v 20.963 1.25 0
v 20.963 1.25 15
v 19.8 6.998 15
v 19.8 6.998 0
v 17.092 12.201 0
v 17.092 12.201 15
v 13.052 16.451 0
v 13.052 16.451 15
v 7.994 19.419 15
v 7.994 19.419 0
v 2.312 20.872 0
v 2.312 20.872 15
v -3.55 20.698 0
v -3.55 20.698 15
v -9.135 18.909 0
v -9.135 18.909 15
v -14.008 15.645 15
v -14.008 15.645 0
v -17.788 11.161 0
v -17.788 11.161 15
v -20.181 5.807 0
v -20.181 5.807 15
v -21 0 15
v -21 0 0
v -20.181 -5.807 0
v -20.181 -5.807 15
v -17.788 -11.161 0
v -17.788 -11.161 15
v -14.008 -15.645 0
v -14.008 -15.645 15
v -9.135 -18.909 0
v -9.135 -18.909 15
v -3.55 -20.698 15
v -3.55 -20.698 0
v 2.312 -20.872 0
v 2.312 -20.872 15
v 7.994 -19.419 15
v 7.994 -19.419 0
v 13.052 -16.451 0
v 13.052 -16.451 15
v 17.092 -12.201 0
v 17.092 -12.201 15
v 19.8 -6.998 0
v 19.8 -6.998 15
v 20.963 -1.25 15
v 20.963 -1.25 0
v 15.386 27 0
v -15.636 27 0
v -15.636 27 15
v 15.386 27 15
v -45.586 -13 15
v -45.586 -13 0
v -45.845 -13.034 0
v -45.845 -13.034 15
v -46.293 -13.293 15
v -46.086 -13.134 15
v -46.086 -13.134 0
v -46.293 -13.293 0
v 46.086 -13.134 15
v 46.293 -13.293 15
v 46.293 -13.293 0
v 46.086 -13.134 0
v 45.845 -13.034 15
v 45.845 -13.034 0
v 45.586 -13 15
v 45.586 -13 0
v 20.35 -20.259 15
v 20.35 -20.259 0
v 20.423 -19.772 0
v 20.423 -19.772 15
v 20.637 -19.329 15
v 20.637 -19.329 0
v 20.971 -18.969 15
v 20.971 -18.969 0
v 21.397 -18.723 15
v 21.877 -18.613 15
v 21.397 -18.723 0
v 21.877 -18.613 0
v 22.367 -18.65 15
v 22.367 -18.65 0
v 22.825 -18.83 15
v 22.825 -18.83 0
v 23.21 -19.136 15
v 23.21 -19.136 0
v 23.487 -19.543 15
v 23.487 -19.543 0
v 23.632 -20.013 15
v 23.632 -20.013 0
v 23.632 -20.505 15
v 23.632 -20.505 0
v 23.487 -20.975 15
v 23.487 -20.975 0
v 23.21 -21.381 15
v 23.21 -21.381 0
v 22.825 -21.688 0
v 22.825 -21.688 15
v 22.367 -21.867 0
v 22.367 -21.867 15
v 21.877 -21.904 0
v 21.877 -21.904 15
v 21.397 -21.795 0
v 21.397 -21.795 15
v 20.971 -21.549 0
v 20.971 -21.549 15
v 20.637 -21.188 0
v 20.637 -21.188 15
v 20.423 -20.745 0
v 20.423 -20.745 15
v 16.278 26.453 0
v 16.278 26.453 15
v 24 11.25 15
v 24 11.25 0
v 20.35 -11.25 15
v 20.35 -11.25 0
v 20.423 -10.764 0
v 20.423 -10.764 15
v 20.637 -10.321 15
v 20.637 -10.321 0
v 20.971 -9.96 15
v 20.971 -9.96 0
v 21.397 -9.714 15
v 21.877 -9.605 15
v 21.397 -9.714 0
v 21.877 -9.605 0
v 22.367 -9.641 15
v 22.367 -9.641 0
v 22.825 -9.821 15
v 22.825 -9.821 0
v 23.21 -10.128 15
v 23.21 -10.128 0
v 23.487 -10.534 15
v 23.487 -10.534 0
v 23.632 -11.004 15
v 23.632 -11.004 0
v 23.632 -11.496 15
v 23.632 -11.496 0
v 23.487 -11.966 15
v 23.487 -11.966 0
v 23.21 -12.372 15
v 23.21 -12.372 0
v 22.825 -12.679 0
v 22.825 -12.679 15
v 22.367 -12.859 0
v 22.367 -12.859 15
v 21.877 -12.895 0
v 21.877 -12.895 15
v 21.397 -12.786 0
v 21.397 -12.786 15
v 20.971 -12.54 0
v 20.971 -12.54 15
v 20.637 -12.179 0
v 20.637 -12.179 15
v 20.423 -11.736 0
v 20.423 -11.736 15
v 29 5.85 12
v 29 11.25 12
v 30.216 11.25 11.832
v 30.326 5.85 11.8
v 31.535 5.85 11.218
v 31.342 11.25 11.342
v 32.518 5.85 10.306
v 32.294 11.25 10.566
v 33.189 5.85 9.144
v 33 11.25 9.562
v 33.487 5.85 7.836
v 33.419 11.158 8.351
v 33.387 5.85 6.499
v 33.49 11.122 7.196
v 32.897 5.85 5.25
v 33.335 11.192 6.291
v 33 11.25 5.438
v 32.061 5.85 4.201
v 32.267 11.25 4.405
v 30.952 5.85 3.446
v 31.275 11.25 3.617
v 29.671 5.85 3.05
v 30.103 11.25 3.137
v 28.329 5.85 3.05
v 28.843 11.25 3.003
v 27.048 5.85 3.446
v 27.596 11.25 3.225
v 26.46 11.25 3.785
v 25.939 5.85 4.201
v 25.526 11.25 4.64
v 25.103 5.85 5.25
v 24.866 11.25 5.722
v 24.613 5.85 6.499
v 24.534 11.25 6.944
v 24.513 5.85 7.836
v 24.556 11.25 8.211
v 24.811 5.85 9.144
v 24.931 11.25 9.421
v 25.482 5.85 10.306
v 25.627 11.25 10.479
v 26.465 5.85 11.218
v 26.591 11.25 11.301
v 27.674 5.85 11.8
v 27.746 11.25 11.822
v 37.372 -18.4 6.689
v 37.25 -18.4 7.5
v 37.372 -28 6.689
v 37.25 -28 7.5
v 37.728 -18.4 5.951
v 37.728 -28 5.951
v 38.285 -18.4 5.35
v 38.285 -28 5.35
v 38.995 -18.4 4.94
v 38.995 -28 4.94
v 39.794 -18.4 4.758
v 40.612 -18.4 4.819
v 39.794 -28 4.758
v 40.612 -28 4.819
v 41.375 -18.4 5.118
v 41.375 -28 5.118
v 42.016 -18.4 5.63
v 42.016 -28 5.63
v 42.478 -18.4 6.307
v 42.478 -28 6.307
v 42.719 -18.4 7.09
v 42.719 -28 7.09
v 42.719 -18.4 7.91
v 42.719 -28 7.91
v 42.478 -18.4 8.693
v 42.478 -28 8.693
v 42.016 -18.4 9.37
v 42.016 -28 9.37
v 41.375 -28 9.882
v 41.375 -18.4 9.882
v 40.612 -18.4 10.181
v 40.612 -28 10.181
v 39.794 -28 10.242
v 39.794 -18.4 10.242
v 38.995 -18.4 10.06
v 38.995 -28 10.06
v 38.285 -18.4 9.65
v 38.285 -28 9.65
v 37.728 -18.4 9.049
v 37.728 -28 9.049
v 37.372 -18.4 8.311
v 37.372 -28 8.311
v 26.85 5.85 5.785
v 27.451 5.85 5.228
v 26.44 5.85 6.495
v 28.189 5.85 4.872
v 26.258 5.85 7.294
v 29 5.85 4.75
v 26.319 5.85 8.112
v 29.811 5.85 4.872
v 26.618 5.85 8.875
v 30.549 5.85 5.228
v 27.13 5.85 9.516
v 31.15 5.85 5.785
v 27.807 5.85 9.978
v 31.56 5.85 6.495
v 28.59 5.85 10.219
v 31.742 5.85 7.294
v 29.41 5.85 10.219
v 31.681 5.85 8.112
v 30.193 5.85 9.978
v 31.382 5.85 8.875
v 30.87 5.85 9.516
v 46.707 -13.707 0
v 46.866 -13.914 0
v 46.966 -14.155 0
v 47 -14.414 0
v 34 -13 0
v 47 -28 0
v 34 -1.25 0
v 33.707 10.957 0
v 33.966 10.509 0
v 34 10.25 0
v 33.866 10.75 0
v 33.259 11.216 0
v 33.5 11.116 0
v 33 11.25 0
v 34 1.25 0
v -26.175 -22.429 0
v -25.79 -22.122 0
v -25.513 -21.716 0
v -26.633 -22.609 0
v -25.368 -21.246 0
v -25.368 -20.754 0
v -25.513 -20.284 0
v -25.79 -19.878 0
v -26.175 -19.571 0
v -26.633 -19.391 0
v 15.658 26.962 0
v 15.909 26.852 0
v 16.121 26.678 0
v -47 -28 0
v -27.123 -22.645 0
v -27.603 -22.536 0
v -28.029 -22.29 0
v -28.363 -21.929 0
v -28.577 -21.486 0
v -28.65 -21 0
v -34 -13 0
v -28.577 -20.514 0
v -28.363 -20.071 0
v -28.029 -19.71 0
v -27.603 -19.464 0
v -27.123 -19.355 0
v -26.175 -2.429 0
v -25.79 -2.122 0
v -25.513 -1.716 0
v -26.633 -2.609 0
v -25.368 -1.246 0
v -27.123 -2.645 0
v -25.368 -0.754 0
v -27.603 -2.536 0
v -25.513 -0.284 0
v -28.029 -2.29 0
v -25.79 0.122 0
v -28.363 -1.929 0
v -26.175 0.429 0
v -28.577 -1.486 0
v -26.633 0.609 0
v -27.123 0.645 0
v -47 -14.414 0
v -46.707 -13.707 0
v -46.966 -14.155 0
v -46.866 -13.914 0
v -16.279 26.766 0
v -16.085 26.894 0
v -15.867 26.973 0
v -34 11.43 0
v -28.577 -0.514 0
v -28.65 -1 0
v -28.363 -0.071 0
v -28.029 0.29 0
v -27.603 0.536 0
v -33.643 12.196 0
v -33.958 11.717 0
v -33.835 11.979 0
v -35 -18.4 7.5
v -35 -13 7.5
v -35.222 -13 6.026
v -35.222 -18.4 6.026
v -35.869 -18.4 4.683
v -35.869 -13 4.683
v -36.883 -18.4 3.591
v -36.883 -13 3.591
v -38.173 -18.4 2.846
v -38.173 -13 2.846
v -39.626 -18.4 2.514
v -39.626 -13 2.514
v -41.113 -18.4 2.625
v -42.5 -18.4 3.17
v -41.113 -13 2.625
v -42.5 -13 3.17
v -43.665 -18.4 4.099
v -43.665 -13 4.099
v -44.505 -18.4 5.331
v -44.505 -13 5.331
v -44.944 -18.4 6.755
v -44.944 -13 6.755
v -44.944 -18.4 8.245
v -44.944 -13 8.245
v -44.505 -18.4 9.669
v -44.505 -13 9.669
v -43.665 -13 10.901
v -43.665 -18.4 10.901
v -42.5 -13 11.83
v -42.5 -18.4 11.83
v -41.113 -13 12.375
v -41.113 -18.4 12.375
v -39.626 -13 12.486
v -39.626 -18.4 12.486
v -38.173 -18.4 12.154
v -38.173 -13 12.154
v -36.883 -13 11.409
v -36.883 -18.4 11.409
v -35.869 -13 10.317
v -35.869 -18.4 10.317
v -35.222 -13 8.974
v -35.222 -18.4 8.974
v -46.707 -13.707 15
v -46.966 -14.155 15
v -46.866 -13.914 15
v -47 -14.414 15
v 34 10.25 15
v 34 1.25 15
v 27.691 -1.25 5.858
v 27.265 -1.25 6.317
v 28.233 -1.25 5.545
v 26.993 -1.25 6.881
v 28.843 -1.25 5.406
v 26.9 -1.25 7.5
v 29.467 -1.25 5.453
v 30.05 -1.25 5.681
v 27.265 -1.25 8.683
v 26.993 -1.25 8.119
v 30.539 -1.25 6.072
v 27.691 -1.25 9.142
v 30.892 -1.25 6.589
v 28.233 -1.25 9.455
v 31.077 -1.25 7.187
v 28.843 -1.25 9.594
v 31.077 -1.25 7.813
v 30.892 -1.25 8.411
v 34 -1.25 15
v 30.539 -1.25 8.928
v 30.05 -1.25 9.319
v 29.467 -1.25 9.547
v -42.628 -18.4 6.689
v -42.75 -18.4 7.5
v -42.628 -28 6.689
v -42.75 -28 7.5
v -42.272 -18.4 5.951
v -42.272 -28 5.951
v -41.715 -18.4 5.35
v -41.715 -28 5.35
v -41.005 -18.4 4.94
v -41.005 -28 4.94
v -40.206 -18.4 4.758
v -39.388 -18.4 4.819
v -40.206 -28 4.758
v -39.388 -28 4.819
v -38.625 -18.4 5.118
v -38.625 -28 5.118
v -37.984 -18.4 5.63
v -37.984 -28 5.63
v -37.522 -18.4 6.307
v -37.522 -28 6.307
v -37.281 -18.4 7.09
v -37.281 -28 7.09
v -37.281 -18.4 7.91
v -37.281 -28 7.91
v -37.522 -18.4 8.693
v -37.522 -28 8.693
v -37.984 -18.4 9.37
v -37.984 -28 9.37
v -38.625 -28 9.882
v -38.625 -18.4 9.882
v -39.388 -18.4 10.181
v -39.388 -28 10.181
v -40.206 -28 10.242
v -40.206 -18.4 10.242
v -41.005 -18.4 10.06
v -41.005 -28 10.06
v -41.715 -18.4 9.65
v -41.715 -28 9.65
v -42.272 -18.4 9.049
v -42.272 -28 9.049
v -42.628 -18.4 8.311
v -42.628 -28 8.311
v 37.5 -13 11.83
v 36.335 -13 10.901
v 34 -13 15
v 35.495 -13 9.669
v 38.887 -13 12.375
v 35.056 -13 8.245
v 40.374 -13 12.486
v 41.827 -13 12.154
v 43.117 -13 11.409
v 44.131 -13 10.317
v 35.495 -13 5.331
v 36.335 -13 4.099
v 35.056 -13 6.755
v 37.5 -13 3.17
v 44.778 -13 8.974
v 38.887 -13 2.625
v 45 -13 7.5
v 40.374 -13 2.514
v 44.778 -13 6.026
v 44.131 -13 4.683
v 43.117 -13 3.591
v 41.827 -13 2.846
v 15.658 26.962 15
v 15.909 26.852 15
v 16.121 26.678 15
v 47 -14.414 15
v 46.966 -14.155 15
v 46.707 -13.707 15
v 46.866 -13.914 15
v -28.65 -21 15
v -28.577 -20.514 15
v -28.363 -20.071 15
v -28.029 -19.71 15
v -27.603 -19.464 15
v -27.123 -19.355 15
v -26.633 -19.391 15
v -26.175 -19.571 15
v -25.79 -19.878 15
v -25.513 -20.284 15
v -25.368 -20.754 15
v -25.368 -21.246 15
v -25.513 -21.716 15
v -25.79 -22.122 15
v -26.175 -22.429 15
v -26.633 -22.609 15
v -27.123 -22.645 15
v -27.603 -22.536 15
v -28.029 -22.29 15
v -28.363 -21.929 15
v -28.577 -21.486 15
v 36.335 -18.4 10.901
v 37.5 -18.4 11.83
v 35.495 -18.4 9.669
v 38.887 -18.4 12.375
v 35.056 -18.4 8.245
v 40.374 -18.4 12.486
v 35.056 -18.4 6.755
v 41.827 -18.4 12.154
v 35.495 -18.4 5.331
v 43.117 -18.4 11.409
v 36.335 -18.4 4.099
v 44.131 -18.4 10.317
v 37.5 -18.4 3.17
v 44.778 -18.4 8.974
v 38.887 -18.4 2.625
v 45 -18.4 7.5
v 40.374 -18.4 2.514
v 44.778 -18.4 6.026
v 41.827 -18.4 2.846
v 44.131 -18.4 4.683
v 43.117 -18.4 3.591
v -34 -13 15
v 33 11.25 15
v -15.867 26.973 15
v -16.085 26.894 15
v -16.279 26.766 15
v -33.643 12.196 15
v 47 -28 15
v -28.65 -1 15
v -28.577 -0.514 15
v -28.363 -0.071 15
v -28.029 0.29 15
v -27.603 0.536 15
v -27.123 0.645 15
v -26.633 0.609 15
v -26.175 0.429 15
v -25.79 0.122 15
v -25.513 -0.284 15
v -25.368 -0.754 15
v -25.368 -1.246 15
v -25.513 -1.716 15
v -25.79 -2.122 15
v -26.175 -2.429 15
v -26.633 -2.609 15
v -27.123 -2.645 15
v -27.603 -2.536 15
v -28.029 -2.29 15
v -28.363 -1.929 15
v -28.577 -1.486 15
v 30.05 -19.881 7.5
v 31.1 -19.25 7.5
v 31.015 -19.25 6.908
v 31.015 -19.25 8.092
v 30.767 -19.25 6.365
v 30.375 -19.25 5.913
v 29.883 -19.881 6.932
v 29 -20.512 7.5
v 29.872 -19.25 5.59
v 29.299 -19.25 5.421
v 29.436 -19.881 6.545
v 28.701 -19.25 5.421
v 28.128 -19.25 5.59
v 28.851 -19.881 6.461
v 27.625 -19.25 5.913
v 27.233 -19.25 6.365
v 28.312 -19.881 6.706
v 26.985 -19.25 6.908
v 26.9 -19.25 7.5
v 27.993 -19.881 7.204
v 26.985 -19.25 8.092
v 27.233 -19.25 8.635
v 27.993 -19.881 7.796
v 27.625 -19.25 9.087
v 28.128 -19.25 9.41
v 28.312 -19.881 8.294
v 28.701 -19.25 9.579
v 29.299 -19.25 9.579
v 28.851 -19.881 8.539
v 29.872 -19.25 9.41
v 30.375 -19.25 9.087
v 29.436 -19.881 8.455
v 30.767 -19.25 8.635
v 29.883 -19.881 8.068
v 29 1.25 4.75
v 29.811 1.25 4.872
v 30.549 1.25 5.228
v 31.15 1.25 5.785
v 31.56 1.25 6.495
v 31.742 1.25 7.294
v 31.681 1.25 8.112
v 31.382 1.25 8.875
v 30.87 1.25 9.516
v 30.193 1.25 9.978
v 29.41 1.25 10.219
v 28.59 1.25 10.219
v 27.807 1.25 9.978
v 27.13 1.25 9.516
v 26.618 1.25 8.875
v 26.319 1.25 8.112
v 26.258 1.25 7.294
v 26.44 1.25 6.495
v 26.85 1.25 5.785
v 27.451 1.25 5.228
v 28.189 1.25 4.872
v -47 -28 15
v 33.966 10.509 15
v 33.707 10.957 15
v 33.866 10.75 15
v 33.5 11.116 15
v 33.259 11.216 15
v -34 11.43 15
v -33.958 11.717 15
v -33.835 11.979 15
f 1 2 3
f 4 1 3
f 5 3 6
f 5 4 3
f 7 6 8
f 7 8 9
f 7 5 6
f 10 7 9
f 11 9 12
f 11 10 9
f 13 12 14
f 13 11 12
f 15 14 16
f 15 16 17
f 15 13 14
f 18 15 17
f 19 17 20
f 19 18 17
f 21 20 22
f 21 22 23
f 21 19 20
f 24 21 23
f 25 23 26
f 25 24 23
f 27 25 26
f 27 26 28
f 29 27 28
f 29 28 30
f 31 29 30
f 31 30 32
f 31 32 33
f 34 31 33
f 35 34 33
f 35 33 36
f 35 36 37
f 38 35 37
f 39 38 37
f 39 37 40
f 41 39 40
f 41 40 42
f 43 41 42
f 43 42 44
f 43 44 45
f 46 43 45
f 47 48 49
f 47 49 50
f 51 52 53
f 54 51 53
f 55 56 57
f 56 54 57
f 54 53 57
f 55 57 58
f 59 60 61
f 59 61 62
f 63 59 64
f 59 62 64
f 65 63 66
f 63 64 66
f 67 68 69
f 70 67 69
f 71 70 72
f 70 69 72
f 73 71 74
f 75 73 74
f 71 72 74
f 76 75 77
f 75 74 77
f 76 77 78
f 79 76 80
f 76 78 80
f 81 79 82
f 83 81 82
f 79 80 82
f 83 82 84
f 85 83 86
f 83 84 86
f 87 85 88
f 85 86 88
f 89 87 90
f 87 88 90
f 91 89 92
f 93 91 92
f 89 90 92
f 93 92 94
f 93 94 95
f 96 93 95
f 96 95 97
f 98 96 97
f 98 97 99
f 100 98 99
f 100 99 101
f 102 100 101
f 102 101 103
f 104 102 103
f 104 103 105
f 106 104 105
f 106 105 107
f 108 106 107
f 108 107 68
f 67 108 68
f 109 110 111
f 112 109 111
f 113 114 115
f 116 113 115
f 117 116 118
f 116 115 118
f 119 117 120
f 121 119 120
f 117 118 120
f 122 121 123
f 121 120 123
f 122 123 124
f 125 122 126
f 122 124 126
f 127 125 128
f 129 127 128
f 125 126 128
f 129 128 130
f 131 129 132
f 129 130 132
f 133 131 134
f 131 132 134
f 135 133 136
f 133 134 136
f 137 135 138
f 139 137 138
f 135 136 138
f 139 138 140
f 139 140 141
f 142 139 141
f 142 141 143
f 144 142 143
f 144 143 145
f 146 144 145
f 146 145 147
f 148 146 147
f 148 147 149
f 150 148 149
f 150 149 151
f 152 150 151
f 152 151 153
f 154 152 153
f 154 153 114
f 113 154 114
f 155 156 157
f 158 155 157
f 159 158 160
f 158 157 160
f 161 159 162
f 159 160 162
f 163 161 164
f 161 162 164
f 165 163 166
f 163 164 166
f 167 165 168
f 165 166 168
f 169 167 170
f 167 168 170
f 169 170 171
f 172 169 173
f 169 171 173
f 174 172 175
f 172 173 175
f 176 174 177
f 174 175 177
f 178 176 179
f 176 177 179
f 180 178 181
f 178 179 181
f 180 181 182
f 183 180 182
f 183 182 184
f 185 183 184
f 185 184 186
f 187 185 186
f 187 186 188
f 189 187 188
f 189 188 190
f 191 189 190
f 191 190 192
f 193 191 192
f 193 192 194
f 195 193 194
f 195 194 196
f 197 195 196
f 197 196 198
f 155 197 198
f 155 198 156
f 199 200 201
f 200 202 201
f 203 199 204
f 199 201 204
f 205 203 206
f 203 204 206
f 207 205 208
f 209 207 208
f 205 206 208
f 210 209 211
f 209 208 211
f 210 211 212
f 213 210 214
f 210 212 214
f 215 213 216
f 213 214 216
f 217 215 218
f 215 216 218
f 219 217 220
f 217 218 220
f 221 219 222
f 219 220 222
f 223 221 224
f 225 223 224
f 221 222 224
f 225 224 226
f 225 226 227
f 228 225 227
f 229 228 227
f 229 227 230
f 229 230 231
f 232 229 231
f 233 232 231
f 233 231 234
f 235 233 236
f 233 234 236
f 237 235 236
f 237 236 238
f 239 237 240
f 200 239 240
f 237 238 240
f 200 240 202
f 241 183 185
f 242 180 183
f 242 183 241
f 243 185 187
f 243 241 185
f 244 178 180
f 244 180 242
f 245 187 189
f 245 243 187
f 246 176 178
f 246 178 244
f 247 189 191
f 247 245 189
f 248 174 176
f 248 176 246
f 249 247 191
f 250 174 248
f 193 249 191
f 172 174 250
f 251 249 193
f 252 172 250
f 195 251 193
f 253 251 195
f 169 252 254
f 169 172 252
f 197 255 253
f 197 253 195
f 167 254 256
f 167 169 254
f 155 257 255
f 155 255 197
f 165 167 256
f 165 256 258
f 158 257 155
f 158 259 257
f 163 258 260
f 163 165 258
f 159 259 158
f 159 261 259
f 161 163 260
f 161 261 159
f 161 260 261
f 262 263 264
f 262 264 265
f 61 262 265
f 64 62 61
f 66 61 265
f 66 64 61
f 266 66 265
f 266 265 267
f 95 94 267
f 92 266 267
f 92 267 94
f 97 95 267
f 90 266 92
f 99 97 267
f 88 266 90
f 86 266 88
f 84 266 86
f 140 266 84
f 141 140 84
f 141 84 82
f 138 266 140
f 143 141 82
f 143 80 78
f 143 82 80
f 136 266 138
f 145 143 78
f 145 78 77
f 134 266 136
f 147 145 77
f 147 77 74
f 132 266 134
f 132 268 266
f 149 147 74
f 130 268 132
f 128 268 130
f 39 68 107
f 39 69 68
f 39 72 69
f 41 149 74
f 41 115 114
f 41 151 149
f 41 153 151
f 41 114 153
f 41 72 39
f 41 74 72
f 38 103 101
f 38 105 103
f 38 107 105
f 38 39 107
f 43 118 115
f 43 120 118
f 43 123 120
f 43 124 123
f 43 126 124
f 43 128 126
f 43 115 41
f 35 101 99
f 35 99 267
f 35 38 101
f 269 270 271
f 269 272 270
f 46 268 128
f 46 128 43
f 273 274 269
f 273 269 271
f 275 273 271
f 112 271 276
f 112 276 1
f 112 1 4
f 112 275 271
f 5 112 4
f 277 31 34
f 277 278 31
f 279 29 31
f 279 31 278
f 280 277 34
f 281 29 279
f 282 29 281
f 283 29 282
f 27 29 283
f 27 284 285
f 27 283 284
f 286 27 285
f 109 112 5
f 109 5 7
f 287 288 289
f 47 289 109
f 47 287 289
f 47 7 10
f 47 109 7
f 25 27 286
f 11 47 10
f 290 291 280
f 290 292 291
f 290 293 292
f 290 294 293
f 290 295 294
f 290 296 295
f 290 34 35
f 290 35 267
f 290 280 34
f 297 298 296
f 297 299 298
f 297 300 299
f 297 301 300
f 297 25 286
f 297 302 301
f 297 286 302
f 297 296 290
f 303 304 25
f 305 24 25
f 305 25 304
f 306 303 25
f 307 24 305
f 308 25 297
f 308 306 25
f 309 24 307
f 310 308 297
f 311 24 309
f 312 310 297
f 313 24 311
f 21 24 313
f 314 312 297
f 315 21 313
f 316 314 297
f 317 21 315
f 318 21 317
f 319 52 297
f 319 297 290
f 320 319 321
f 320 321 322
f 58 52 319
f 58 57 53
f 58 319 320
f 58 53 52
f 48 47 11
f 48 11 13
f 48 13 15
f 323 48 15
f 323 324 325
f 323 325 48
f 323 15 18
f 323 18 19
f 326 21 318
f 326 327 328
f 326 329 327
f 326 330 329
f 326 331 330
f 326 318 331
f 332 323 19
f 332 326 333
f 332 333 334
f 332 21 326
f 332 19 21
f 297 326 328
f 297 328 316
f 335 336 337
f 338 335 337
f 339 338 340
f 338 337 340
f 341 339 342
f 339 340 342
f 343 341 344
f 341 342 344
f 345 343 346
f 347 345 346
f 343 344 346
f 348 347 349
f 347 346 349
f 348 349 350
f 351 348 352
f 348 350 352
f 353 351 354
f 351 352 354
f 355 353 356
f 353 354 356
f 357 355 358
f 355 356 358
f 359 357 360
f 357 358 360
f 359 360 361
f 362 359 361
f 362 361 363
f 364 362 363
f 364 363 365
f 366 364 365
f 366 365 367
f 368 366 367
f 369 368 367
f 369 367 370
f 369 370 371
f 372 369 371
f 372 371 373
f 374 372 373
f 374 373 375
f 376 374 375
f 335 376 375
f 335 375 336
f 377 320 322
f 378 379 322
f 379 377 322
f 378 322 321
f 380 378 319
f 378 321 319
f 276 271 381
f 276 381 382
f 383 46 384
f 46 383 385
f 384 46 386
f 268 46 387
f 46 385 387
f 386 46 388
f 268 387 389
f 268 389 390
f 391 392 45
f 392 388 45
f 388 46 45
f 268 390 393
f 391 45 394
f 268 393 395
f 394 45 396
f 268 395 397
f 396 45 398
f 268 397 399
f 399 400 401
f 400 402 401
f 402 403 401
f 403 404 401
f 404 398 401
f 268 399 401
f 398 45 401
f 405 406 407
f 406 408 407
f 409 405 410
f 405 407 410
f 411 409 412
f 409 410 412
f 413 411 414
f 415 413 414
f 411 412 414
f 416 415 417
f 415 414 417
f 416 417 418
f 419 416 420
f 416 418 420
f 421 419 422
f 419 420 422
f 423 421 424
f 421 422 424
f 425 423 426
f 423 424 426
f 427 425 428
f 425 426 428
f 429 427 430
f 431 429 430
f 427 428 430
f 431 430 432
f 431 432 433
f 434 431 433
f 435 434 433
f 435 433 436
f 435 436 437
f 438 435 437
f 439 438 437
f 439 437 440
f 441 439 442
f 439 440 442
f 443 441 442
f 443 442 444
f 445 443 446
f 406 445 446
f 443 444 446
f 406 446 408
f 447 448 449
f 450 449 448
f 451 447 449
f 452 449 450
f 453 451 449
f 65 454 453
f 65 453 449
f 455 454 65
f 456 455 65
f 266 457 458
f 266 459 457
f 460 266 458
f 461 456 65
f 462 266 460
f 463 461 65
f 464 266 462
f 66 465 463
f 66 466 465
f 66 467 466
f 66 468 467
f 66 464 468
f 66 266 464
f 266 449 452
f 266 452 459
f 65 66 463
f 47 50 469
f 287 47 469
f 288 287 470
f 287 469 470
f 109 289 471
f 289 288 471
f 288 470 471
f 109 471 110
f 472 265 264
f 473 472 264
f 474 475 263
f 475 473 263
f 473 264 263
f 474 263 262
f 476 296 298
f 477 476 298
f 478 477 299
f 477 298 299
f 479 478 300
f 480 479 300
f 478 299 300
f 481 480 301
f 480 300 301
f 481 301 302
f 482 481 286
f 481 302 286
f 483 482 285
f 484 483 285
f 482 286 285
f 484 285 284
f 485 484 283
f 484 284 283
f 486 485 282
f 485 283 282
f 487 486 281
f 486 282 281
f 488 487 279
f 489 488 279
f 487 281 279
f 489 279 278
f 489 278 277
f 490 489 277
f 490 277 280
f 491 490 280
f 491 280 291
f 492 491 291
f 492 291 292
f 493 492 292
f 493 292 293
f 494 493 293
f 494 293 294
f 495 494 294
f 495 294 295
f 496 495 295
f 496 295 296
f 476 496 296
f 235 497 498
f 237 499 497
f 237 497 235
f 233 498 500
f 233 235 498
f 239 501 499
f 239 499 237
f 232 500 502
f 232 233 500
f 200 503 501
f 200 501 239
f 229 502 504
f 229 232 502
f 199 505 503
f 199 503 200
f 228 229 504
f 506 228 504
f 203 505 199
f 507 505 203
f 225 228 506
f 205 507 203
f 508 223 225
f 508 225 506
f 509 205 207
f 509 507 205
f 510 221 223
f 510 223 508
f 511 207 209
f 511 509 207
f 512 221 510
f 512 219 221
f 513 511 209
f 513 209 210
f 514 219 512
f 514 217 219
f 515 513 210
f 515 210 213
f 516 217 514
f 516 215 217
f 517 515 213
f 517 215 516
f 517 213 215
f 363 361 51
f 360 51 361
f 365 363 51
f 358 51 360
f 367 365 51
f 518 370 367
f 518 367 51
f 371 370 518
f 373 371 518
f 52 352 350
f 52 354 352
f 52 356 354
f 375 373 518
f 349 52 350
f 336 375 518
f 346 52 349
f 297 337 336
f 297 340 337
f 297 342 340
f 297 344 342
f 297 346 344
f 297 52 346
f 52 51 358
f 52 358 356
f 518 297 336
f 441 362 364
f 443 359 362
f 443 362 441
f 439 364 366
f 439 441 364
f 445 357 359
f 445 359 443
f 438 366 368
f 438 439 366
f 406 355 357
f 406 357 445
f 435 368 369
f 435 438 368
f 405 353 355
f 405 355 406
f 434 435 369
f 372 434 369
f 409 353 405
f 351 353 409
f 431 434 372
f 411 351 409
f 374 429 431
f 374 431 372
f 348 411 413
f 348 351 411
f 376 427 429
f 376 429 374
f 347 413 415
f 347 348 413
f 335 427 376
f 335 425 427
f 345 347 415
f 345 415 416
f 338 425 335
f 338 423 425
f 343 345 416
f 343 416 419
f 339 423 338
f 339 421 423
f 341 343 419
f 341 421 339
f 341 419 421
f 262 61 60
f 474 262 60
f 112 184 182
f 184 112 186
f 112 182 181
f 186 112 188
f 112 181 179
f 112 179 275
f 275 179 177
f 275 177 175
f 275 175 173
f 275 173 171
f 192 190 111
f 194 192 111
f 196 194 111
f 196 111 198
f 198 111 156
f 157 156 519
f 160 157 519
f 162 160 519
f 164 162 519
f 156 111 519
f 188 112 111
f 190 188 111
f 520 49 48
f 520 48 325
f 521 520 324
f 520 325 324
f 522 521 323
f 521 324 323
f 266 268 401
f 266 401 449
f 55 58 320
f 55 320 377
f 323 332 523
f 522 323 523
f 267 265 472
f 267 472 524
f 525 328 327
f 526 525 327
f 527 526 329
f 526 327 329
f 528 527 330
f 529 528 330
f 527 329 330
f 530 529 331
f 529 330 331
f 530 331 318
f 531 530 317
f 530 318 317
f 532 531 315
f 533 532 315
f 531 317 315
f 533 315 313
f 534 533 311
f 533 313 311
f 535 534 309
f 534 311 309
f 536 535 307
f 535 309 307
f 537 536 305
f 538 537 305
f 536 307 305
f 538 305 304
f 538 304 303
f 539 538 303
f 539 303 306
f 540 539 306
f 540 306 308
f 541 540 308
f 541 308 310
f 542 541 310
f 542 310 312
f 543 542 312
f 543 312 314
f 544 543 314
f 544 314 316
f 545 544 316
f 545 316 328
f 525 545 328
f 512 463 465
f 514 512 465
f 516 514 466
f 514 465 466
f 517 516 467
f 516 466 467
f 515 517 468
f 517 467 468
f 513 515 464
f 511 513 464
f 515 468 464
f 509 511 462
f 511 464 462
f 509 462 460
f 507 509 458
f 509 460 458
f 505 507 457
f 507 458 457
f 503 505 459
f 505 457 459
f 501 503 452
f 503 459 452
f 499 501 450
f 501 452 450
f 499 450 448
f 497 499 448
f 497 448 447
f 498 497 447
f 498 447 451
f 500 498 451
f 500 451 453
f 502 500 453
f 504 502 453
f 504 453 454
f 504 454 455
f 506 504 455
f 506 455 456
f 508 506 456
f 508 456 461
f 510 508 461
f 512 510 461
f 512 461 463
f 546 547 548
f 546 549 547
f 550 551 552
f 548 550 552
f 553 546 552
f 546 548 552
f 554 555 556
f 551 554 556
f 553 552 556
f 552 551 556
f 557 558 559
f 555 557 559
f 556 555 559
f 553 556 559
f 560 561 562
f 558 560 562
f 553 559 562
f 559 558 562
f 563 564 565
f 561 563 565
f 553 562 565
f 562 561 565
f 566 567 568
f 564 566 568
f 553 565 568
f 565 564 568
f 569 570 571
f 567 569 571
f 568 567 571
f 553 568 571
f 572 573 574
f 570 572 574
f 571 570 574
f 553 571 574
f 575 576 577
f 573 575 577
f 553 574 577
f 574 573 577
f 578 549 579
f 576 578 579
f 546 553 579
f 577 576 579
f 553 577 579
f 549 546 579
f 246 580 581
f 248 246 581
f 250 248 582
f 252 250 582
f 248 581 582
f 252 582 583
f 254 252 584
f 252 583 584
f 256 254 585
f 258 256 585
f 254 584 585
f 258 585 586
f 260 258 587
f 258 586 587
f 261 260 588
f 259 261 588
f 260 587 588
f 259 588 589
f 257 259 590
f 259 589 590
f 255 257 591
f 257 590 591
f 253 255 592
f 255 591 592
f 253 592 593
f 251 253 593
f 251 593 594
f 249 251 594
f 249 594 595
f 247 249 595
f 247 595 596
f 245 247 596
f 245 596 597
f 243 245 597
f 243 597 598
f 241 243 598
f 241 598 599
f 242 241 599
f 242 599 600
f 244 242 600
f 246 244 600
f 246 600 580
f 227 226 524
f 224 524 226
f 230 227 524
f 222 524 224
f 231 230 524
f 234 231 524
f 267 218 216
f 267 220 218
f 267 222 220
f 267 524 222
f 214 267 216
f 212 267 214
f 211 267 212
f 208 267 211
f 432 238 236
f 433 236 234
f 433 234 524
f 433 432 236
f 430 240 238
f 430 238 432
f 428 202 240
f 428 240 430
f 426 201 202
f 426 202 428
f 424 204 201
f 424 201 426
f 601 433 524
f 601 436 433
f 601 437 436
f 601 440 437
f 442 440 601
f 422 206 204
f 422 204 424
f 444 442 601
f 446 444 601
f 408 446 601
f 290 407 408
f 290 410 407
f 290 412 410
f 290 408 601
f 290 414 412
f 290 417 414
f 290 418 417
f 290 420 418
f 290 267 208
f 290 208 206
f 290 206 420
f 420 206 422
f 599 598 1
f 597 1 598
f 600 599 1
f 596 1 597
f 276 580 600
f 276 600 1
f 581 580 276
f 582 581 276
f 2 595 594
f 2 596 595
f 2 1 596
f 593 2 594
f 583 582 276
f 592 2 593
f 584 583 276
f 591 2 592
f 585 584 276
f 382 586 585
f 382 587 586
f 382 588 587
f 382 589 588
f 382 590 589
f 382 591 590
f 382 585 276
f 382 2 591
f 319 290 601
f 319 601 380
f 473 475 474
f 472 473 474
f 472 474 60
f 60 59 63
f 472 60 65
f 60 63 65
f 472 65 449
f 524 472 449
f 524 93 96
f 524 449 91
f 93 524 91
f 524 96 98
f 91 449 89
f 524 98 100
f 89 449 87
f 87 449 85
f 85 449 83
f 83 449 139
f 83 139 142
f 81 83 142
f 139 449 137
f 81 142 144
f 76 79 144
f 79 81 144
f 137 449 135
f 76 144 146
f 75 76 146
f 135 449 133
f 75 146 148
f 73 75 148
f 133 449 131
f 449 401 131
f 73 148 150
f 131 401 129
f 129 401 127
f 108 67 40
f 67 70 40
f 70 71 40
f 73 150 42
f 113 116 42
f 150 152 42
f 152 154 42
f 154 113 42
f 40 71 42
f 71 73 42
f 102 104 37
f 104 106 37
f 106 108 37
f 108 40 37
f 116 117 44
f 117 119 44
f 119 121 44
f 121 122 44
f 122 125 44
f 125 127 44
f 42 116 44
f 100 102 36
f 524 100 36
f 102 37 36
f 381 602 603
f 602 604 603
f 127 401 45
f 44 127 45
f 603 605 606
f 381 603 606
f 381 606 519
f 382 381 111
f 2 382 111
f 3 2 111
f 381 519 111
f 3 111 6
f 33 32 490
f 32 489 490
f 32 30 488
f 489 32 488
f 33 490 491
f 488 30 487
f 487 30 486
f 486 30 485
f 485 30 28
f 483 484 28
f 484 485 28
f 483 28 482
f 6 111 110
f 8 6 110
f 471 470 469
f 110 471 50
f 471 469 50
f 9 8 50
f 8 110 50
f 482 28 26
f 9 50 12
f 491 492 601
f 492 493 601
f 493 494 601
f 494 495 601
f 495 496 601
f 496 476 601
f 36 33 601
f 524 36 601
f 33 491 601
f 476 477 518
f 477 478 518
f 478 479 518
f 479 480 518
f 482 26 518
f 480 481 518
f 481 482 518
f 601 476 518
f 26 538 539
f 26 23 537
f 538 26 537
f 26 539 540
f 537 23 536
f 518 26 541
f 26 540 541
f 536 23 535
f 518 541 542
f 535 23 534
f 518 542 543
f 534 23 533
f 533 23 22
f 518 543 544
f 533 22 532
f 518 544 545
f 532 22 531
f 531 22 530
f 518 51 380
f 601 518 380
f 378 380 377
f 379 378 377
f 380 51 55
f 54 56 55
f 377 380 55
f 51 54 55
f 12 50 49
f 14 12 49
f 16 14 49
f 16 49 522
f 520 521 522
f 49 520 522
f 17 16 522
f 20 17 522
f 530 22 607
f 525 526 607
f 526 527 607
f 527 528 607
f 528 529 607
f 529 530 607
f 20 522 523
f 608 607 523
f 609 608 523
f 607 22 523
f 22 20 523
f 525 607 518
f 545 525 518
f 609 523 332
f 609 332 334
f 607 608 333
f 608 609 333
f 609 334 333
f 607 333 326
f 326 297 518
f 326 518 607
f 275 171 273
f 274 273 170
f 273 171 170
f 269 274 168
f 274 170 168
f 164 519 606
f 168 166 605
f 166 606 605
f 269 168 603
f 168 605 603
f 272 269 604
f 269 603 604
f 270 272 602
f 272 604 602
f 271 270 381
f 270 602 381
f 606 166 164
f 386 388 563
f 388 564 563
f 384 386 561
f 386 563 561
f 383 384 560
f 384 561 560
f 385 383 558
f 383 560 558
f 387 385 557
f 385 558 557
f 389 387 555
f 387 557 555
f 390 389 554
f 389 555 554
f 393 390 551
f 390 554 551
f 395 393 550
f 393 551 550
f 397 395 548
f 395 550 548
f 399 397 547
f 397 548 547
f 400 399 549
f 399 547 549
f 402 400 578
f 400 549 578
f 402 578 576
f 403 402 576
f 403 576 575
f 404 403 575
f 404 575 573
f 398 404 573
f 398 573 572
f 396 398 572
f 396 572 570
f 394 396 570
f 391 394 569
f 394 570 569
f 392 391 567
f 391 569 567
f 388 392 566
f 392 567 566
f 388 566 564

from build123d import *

# Parameters (mm, degrees)
SKETCH1_R                                            = 21
BOSS_EXTRUDE1_DEPTH                                  = 15
SKETCH2_W                                            = 42.201264836
SKETCH2_H                                            = 2.5
CUT_EXTRUDE1_DEPTH                                   = 15
CUT_EXTRUDE2_DEPTH                                   = 15
CBORE_SLOT_FOR_M5_HEX_SOCKET_HEAD_CAP_SC_D           = 5.5
CBORE_SLOT_FOR_M5_HEX_SOCKET_HEAD_CAP_SC_CBORE_D     = 10
CBORE_SLOT_FOR_M5_HEX_SOCKET_HEAD_CAP_SC_CBORE_DEPTH = 5.4
CBORE_FOR_M5_HEX_SOCKET_HEAD_CAP_SCREW1_D            = 5.5
CBORE_FOR_M5_HEX_SOCKET_HEAD_CAP_SCREW1_DEPTH        = 10
CBORE_FOR_M5_HEX_SOCKET_HEAD_CAP_SCREW1_CBORE_D      = 9
CBORE_FOR_M5_HEX_SOCKET_HEAD_CAP_SCREW1_CBORE_DEPTH  = 5.4
CHAMFER1_SIZE                                        = 1
M4_TAPPED_HOLE1_D                                    = 3.3
M5_TAPPED_HOLE1_D                                    = 4.2
M5_TAPPED_HOLE1_DEPTH                                = 18
M5_TAPPED_HOLE1_TIP                                  = 1.2618073
CHAMFER2_SIZE                                        = 18
CHAMFER2_SIZE2                                       = 15.103793361
FILLET1_R                                            = 1


with BuildPart() as part:
    # Sketch1 → Boss-Extrude1 (new body)
    with BuildSketch(Plane.XY):
        Polygon((47, -28), (-47, -28), (-47, -13), (-34, -13), (-34, 27), (34, 27), (34, -13), (47, -13), align=None)
        Circle(SKETCH1_R, mode=Mode.SUBTRACT)
    extrude(amount=BOSS_EXTRUDE1_DEPTH)

    # Sketch2 → Cut-Extrude1 (cut)
    with BuildSketch(Plane.XY.offset(15)):
        with Locations((34, 0)):
            Rectangle(SKETCH2_W, SKETCH2_H)
    extrude(amount=-CUT_EXTRUDE1_DEPTH, mode=Mode.SUBTRACT)

    # Sketch3 → Cut-Extrude2 (cut)
    with BuildSketch(Plane.XY.offset(15)):
        Polygon((34, 27), (16, 27), (24, 11.25), (34, 11.25), align=None)
    extrude(amount=-CUT_EXTRUDE2_DEPTH, mode=Mode.SUBTRACT)

    # CBORE SLOT for M5 Hex Socket Head Cap Screw1 (through all)
    with Locations(Plane(origin=(0, -13, 0), x_dir=(1, 0, 0), z_dir=(0, 1, 0))):
        with Locations((-40, -7.5), (40, -7.5)):
            CounterBoreHole(CBORE_SLOT_FOR_M5_HEX_SOCKET_HEAD_CAP_SC_D / 2, CBORE_SLOT_FOR_M5_HEX_SOCKET_HEAD_CAP_SC_CBORE_D / 2, CBORE_SLOT_FOR_M5_HEX_SOCKET_HEAD_CAP_SC_CBORE_DEPTH)

    # CBORE for M5 Hex Socket Head Cap Screw1
    with Locations(Plane(origin=(29, 11.25, 7.5), x_dir=(0, 0, 1), z_dir=(0, 1, 0))):
        with Locations((0, 0)):
            CounterBoreHole(CBORE_FOR_M5_HEX_SOCKET_HEAD_CAP_SCREW1_D / 2, CBORE_FOR_M5_HEX_SOCKET_HEAD_CAP_SCREW1_CBORE_D / 2, CBORE_FOR_M5_HEX_SOCKET_HEAD_CAP_SCREW1_CBORE_DEPTH, depth=CBORE_FOR_M5_HEX_SOCKET_HEAD_CAP_SCREW1_DEPTH)

    # Chamfer1
    chamfer1_edges = [part.edges().sort_by_distance(p)[0] for p in [
        (47, -13, 7.5),
        (-47, -13, 7.5),
    ]]
    chamfer(chamfer1_edges, length=CHAMFER1_SIZE)

    # M4 Tapped Hole1 (through all)
    with Locations(Plane(origin=(-27, -21, 15), x_dir=(1, 0, 0), z_dir=(0, 0, 1))):
        with Locations((0, 0), (0, 20), (49, 0.741264898), (49, 9.75)):
            Hole(M4_TAPPED_HOLE1_D / 2)

    # M5 Tapped Hole1
    with Locations(Plane(origin=(29, -1.25, 7.5), x_dir=(1, 0, 0), z_dir=(0, 1, 0))):
        with Locations((0, 0)):
            Hole(M5_TAPPED_HOLE1_D / 2, depth=M5_TAPPED_HOLE1_DEPTH)
            with Locations((0, 0, -(M5_TAPPED_HOLE1_DEPTH + M5_TAPPED_HOLE1_TIP / 2))):  # 118° drill point
                Cone(0, M5_TAPPED_HOLE1_D / 2, M5_TAPPED_HOLE1_TIP, mode=Mode.SUBTRACT)

    # Chamfer2
    chamfer2_edges = [part.edges().sort_by_distance(p)[0] for p in [
        (-34, 27, 7.5),
    ]]
    chamfer2_side = [part.faces().sort_by_distance(p)[0] for p in [
        (-9, 27, 7.5),
    ]]
    chamfer(chamfer2_edges, length=CHAMFER2_SIZE, length2=CHAMFER2_SIZE2, reference=chamfer2_side[0])

    # Fillet1
    # the kernel refuses this fillet: 1 mm, written as the material it takes off along each edge
    with BuildSketch(Plane(origin=(47, -14, -1.035533906), x_dir=(0, -1, 0), z_dir=(0, 0, 1)), Plane(origin=(-47, -14, -1.035533906), x_dir=(0.7071067811865497, 0.7071067811865454, 0), z_dir=(0, 0, 1)), Plane(origin=(-46, -13, -1.035533906), x_dir=(1, 0, 0), z_dir=(0, 0, 1)), Plane(origin=(46, -13, -1.035533906), x_dir=(0.7071067811865455, -0.7071067811865497, 0), z_dir=(0, 0, 1))) as fillet1_piece_1:
        with BuildLine():
            CenterArc((FILLET1_R * 0.414213562373, -FILLET1_R), FILLET1_R, 90, 45)
            Line((-FILLET1_R * 0.292893218813, -FILLET1_R * 0.292893218813), (0, 0))
            Line((0, 0), (FILLET1_R * 0.414213562373, 0))
        make_face()
    extrude(amount=17.071067812, mode=Mode.SUBTRACT)
    with BuildSketch(Plane(origin=(-34, 11.896206639, -1.165769145), x_dir=(0, -1, 0), z_dir=(0, 0, 1))) as fillet1_piece_2:
        with BuildLine():
            CenterArc((FILLET1_R * 0.466307658155, FILLET1_R), FILLET1_R, 220, 50)
            Line((-FILLET1_R * 0.299736784964, FILLET1_R * 0.357212390313), (0, 0))
            Line((0, 0), (FILLET1_R * 0.466307658155, 0))
        make_face()
    extrude(amount=17.331538291, mode=Mode.SUBTRACT)
    with BuildSketch(Plane(origin=(-16, 27, -0.909925586), x_dir=(-0.7660444431189759, -0.6427876096865418, 0), z_dir=(0, 0, 1))) as fillet1_piece_3:
        with BuildLine():
            CenterArc((FILLET1_R * 0.363970234266, FILLET1_R), FILLET1_R, 230, 40)
            Line((-FILLET1_R * 0.27881737542, FILLET1_R * 0.233955556881), (0, 0))
            Line((0, 0), (FILLET1_R * 0.363970234266, 0))
        make_face()
    extrude(amount=16.819851171, mode=Mode.SUBTRACT)
    with BuildSketch(Plane(origin=(34, 11.25, 17.5), x_dir=(-1, 0, 0), z_dir=(0, 0, -1))) as fillet1_piece_4:
        with BuildLine():
            CenterArc((FILLET1_R, -FILLET1_R), FILLET1_R, 90, 90)
            Line((0, -FILLET1_R), (0, 0))
            Line((0, 0), (FILLET1_R, 0))
        make_face()
    extrude(amount=20, mode=Mode.SUBTRACT)
    with BuildSketch(Plane(origin=(16, 27, 16.534173147), x_dir=(-1, 0, 0), z_dir=(0, 0, -1))) as fillet1_piece_5:
        with BuildLine():
            CenterArc((FILLET1_R * 0.613669258853, -FILLET1_R), FILLET1_R, 90, 63.072322149)
            Line((-FILLET1_R * 0.27790960924, -FILLET1_R * 0.547134543191), (0, 0))
            Line((0, 0), (FILLET1_R * 0.613669258853, 0))
        make_face()
    extrude(amount=18.068346294, mode=Mode.SUBTRACT)


solid = part.part
